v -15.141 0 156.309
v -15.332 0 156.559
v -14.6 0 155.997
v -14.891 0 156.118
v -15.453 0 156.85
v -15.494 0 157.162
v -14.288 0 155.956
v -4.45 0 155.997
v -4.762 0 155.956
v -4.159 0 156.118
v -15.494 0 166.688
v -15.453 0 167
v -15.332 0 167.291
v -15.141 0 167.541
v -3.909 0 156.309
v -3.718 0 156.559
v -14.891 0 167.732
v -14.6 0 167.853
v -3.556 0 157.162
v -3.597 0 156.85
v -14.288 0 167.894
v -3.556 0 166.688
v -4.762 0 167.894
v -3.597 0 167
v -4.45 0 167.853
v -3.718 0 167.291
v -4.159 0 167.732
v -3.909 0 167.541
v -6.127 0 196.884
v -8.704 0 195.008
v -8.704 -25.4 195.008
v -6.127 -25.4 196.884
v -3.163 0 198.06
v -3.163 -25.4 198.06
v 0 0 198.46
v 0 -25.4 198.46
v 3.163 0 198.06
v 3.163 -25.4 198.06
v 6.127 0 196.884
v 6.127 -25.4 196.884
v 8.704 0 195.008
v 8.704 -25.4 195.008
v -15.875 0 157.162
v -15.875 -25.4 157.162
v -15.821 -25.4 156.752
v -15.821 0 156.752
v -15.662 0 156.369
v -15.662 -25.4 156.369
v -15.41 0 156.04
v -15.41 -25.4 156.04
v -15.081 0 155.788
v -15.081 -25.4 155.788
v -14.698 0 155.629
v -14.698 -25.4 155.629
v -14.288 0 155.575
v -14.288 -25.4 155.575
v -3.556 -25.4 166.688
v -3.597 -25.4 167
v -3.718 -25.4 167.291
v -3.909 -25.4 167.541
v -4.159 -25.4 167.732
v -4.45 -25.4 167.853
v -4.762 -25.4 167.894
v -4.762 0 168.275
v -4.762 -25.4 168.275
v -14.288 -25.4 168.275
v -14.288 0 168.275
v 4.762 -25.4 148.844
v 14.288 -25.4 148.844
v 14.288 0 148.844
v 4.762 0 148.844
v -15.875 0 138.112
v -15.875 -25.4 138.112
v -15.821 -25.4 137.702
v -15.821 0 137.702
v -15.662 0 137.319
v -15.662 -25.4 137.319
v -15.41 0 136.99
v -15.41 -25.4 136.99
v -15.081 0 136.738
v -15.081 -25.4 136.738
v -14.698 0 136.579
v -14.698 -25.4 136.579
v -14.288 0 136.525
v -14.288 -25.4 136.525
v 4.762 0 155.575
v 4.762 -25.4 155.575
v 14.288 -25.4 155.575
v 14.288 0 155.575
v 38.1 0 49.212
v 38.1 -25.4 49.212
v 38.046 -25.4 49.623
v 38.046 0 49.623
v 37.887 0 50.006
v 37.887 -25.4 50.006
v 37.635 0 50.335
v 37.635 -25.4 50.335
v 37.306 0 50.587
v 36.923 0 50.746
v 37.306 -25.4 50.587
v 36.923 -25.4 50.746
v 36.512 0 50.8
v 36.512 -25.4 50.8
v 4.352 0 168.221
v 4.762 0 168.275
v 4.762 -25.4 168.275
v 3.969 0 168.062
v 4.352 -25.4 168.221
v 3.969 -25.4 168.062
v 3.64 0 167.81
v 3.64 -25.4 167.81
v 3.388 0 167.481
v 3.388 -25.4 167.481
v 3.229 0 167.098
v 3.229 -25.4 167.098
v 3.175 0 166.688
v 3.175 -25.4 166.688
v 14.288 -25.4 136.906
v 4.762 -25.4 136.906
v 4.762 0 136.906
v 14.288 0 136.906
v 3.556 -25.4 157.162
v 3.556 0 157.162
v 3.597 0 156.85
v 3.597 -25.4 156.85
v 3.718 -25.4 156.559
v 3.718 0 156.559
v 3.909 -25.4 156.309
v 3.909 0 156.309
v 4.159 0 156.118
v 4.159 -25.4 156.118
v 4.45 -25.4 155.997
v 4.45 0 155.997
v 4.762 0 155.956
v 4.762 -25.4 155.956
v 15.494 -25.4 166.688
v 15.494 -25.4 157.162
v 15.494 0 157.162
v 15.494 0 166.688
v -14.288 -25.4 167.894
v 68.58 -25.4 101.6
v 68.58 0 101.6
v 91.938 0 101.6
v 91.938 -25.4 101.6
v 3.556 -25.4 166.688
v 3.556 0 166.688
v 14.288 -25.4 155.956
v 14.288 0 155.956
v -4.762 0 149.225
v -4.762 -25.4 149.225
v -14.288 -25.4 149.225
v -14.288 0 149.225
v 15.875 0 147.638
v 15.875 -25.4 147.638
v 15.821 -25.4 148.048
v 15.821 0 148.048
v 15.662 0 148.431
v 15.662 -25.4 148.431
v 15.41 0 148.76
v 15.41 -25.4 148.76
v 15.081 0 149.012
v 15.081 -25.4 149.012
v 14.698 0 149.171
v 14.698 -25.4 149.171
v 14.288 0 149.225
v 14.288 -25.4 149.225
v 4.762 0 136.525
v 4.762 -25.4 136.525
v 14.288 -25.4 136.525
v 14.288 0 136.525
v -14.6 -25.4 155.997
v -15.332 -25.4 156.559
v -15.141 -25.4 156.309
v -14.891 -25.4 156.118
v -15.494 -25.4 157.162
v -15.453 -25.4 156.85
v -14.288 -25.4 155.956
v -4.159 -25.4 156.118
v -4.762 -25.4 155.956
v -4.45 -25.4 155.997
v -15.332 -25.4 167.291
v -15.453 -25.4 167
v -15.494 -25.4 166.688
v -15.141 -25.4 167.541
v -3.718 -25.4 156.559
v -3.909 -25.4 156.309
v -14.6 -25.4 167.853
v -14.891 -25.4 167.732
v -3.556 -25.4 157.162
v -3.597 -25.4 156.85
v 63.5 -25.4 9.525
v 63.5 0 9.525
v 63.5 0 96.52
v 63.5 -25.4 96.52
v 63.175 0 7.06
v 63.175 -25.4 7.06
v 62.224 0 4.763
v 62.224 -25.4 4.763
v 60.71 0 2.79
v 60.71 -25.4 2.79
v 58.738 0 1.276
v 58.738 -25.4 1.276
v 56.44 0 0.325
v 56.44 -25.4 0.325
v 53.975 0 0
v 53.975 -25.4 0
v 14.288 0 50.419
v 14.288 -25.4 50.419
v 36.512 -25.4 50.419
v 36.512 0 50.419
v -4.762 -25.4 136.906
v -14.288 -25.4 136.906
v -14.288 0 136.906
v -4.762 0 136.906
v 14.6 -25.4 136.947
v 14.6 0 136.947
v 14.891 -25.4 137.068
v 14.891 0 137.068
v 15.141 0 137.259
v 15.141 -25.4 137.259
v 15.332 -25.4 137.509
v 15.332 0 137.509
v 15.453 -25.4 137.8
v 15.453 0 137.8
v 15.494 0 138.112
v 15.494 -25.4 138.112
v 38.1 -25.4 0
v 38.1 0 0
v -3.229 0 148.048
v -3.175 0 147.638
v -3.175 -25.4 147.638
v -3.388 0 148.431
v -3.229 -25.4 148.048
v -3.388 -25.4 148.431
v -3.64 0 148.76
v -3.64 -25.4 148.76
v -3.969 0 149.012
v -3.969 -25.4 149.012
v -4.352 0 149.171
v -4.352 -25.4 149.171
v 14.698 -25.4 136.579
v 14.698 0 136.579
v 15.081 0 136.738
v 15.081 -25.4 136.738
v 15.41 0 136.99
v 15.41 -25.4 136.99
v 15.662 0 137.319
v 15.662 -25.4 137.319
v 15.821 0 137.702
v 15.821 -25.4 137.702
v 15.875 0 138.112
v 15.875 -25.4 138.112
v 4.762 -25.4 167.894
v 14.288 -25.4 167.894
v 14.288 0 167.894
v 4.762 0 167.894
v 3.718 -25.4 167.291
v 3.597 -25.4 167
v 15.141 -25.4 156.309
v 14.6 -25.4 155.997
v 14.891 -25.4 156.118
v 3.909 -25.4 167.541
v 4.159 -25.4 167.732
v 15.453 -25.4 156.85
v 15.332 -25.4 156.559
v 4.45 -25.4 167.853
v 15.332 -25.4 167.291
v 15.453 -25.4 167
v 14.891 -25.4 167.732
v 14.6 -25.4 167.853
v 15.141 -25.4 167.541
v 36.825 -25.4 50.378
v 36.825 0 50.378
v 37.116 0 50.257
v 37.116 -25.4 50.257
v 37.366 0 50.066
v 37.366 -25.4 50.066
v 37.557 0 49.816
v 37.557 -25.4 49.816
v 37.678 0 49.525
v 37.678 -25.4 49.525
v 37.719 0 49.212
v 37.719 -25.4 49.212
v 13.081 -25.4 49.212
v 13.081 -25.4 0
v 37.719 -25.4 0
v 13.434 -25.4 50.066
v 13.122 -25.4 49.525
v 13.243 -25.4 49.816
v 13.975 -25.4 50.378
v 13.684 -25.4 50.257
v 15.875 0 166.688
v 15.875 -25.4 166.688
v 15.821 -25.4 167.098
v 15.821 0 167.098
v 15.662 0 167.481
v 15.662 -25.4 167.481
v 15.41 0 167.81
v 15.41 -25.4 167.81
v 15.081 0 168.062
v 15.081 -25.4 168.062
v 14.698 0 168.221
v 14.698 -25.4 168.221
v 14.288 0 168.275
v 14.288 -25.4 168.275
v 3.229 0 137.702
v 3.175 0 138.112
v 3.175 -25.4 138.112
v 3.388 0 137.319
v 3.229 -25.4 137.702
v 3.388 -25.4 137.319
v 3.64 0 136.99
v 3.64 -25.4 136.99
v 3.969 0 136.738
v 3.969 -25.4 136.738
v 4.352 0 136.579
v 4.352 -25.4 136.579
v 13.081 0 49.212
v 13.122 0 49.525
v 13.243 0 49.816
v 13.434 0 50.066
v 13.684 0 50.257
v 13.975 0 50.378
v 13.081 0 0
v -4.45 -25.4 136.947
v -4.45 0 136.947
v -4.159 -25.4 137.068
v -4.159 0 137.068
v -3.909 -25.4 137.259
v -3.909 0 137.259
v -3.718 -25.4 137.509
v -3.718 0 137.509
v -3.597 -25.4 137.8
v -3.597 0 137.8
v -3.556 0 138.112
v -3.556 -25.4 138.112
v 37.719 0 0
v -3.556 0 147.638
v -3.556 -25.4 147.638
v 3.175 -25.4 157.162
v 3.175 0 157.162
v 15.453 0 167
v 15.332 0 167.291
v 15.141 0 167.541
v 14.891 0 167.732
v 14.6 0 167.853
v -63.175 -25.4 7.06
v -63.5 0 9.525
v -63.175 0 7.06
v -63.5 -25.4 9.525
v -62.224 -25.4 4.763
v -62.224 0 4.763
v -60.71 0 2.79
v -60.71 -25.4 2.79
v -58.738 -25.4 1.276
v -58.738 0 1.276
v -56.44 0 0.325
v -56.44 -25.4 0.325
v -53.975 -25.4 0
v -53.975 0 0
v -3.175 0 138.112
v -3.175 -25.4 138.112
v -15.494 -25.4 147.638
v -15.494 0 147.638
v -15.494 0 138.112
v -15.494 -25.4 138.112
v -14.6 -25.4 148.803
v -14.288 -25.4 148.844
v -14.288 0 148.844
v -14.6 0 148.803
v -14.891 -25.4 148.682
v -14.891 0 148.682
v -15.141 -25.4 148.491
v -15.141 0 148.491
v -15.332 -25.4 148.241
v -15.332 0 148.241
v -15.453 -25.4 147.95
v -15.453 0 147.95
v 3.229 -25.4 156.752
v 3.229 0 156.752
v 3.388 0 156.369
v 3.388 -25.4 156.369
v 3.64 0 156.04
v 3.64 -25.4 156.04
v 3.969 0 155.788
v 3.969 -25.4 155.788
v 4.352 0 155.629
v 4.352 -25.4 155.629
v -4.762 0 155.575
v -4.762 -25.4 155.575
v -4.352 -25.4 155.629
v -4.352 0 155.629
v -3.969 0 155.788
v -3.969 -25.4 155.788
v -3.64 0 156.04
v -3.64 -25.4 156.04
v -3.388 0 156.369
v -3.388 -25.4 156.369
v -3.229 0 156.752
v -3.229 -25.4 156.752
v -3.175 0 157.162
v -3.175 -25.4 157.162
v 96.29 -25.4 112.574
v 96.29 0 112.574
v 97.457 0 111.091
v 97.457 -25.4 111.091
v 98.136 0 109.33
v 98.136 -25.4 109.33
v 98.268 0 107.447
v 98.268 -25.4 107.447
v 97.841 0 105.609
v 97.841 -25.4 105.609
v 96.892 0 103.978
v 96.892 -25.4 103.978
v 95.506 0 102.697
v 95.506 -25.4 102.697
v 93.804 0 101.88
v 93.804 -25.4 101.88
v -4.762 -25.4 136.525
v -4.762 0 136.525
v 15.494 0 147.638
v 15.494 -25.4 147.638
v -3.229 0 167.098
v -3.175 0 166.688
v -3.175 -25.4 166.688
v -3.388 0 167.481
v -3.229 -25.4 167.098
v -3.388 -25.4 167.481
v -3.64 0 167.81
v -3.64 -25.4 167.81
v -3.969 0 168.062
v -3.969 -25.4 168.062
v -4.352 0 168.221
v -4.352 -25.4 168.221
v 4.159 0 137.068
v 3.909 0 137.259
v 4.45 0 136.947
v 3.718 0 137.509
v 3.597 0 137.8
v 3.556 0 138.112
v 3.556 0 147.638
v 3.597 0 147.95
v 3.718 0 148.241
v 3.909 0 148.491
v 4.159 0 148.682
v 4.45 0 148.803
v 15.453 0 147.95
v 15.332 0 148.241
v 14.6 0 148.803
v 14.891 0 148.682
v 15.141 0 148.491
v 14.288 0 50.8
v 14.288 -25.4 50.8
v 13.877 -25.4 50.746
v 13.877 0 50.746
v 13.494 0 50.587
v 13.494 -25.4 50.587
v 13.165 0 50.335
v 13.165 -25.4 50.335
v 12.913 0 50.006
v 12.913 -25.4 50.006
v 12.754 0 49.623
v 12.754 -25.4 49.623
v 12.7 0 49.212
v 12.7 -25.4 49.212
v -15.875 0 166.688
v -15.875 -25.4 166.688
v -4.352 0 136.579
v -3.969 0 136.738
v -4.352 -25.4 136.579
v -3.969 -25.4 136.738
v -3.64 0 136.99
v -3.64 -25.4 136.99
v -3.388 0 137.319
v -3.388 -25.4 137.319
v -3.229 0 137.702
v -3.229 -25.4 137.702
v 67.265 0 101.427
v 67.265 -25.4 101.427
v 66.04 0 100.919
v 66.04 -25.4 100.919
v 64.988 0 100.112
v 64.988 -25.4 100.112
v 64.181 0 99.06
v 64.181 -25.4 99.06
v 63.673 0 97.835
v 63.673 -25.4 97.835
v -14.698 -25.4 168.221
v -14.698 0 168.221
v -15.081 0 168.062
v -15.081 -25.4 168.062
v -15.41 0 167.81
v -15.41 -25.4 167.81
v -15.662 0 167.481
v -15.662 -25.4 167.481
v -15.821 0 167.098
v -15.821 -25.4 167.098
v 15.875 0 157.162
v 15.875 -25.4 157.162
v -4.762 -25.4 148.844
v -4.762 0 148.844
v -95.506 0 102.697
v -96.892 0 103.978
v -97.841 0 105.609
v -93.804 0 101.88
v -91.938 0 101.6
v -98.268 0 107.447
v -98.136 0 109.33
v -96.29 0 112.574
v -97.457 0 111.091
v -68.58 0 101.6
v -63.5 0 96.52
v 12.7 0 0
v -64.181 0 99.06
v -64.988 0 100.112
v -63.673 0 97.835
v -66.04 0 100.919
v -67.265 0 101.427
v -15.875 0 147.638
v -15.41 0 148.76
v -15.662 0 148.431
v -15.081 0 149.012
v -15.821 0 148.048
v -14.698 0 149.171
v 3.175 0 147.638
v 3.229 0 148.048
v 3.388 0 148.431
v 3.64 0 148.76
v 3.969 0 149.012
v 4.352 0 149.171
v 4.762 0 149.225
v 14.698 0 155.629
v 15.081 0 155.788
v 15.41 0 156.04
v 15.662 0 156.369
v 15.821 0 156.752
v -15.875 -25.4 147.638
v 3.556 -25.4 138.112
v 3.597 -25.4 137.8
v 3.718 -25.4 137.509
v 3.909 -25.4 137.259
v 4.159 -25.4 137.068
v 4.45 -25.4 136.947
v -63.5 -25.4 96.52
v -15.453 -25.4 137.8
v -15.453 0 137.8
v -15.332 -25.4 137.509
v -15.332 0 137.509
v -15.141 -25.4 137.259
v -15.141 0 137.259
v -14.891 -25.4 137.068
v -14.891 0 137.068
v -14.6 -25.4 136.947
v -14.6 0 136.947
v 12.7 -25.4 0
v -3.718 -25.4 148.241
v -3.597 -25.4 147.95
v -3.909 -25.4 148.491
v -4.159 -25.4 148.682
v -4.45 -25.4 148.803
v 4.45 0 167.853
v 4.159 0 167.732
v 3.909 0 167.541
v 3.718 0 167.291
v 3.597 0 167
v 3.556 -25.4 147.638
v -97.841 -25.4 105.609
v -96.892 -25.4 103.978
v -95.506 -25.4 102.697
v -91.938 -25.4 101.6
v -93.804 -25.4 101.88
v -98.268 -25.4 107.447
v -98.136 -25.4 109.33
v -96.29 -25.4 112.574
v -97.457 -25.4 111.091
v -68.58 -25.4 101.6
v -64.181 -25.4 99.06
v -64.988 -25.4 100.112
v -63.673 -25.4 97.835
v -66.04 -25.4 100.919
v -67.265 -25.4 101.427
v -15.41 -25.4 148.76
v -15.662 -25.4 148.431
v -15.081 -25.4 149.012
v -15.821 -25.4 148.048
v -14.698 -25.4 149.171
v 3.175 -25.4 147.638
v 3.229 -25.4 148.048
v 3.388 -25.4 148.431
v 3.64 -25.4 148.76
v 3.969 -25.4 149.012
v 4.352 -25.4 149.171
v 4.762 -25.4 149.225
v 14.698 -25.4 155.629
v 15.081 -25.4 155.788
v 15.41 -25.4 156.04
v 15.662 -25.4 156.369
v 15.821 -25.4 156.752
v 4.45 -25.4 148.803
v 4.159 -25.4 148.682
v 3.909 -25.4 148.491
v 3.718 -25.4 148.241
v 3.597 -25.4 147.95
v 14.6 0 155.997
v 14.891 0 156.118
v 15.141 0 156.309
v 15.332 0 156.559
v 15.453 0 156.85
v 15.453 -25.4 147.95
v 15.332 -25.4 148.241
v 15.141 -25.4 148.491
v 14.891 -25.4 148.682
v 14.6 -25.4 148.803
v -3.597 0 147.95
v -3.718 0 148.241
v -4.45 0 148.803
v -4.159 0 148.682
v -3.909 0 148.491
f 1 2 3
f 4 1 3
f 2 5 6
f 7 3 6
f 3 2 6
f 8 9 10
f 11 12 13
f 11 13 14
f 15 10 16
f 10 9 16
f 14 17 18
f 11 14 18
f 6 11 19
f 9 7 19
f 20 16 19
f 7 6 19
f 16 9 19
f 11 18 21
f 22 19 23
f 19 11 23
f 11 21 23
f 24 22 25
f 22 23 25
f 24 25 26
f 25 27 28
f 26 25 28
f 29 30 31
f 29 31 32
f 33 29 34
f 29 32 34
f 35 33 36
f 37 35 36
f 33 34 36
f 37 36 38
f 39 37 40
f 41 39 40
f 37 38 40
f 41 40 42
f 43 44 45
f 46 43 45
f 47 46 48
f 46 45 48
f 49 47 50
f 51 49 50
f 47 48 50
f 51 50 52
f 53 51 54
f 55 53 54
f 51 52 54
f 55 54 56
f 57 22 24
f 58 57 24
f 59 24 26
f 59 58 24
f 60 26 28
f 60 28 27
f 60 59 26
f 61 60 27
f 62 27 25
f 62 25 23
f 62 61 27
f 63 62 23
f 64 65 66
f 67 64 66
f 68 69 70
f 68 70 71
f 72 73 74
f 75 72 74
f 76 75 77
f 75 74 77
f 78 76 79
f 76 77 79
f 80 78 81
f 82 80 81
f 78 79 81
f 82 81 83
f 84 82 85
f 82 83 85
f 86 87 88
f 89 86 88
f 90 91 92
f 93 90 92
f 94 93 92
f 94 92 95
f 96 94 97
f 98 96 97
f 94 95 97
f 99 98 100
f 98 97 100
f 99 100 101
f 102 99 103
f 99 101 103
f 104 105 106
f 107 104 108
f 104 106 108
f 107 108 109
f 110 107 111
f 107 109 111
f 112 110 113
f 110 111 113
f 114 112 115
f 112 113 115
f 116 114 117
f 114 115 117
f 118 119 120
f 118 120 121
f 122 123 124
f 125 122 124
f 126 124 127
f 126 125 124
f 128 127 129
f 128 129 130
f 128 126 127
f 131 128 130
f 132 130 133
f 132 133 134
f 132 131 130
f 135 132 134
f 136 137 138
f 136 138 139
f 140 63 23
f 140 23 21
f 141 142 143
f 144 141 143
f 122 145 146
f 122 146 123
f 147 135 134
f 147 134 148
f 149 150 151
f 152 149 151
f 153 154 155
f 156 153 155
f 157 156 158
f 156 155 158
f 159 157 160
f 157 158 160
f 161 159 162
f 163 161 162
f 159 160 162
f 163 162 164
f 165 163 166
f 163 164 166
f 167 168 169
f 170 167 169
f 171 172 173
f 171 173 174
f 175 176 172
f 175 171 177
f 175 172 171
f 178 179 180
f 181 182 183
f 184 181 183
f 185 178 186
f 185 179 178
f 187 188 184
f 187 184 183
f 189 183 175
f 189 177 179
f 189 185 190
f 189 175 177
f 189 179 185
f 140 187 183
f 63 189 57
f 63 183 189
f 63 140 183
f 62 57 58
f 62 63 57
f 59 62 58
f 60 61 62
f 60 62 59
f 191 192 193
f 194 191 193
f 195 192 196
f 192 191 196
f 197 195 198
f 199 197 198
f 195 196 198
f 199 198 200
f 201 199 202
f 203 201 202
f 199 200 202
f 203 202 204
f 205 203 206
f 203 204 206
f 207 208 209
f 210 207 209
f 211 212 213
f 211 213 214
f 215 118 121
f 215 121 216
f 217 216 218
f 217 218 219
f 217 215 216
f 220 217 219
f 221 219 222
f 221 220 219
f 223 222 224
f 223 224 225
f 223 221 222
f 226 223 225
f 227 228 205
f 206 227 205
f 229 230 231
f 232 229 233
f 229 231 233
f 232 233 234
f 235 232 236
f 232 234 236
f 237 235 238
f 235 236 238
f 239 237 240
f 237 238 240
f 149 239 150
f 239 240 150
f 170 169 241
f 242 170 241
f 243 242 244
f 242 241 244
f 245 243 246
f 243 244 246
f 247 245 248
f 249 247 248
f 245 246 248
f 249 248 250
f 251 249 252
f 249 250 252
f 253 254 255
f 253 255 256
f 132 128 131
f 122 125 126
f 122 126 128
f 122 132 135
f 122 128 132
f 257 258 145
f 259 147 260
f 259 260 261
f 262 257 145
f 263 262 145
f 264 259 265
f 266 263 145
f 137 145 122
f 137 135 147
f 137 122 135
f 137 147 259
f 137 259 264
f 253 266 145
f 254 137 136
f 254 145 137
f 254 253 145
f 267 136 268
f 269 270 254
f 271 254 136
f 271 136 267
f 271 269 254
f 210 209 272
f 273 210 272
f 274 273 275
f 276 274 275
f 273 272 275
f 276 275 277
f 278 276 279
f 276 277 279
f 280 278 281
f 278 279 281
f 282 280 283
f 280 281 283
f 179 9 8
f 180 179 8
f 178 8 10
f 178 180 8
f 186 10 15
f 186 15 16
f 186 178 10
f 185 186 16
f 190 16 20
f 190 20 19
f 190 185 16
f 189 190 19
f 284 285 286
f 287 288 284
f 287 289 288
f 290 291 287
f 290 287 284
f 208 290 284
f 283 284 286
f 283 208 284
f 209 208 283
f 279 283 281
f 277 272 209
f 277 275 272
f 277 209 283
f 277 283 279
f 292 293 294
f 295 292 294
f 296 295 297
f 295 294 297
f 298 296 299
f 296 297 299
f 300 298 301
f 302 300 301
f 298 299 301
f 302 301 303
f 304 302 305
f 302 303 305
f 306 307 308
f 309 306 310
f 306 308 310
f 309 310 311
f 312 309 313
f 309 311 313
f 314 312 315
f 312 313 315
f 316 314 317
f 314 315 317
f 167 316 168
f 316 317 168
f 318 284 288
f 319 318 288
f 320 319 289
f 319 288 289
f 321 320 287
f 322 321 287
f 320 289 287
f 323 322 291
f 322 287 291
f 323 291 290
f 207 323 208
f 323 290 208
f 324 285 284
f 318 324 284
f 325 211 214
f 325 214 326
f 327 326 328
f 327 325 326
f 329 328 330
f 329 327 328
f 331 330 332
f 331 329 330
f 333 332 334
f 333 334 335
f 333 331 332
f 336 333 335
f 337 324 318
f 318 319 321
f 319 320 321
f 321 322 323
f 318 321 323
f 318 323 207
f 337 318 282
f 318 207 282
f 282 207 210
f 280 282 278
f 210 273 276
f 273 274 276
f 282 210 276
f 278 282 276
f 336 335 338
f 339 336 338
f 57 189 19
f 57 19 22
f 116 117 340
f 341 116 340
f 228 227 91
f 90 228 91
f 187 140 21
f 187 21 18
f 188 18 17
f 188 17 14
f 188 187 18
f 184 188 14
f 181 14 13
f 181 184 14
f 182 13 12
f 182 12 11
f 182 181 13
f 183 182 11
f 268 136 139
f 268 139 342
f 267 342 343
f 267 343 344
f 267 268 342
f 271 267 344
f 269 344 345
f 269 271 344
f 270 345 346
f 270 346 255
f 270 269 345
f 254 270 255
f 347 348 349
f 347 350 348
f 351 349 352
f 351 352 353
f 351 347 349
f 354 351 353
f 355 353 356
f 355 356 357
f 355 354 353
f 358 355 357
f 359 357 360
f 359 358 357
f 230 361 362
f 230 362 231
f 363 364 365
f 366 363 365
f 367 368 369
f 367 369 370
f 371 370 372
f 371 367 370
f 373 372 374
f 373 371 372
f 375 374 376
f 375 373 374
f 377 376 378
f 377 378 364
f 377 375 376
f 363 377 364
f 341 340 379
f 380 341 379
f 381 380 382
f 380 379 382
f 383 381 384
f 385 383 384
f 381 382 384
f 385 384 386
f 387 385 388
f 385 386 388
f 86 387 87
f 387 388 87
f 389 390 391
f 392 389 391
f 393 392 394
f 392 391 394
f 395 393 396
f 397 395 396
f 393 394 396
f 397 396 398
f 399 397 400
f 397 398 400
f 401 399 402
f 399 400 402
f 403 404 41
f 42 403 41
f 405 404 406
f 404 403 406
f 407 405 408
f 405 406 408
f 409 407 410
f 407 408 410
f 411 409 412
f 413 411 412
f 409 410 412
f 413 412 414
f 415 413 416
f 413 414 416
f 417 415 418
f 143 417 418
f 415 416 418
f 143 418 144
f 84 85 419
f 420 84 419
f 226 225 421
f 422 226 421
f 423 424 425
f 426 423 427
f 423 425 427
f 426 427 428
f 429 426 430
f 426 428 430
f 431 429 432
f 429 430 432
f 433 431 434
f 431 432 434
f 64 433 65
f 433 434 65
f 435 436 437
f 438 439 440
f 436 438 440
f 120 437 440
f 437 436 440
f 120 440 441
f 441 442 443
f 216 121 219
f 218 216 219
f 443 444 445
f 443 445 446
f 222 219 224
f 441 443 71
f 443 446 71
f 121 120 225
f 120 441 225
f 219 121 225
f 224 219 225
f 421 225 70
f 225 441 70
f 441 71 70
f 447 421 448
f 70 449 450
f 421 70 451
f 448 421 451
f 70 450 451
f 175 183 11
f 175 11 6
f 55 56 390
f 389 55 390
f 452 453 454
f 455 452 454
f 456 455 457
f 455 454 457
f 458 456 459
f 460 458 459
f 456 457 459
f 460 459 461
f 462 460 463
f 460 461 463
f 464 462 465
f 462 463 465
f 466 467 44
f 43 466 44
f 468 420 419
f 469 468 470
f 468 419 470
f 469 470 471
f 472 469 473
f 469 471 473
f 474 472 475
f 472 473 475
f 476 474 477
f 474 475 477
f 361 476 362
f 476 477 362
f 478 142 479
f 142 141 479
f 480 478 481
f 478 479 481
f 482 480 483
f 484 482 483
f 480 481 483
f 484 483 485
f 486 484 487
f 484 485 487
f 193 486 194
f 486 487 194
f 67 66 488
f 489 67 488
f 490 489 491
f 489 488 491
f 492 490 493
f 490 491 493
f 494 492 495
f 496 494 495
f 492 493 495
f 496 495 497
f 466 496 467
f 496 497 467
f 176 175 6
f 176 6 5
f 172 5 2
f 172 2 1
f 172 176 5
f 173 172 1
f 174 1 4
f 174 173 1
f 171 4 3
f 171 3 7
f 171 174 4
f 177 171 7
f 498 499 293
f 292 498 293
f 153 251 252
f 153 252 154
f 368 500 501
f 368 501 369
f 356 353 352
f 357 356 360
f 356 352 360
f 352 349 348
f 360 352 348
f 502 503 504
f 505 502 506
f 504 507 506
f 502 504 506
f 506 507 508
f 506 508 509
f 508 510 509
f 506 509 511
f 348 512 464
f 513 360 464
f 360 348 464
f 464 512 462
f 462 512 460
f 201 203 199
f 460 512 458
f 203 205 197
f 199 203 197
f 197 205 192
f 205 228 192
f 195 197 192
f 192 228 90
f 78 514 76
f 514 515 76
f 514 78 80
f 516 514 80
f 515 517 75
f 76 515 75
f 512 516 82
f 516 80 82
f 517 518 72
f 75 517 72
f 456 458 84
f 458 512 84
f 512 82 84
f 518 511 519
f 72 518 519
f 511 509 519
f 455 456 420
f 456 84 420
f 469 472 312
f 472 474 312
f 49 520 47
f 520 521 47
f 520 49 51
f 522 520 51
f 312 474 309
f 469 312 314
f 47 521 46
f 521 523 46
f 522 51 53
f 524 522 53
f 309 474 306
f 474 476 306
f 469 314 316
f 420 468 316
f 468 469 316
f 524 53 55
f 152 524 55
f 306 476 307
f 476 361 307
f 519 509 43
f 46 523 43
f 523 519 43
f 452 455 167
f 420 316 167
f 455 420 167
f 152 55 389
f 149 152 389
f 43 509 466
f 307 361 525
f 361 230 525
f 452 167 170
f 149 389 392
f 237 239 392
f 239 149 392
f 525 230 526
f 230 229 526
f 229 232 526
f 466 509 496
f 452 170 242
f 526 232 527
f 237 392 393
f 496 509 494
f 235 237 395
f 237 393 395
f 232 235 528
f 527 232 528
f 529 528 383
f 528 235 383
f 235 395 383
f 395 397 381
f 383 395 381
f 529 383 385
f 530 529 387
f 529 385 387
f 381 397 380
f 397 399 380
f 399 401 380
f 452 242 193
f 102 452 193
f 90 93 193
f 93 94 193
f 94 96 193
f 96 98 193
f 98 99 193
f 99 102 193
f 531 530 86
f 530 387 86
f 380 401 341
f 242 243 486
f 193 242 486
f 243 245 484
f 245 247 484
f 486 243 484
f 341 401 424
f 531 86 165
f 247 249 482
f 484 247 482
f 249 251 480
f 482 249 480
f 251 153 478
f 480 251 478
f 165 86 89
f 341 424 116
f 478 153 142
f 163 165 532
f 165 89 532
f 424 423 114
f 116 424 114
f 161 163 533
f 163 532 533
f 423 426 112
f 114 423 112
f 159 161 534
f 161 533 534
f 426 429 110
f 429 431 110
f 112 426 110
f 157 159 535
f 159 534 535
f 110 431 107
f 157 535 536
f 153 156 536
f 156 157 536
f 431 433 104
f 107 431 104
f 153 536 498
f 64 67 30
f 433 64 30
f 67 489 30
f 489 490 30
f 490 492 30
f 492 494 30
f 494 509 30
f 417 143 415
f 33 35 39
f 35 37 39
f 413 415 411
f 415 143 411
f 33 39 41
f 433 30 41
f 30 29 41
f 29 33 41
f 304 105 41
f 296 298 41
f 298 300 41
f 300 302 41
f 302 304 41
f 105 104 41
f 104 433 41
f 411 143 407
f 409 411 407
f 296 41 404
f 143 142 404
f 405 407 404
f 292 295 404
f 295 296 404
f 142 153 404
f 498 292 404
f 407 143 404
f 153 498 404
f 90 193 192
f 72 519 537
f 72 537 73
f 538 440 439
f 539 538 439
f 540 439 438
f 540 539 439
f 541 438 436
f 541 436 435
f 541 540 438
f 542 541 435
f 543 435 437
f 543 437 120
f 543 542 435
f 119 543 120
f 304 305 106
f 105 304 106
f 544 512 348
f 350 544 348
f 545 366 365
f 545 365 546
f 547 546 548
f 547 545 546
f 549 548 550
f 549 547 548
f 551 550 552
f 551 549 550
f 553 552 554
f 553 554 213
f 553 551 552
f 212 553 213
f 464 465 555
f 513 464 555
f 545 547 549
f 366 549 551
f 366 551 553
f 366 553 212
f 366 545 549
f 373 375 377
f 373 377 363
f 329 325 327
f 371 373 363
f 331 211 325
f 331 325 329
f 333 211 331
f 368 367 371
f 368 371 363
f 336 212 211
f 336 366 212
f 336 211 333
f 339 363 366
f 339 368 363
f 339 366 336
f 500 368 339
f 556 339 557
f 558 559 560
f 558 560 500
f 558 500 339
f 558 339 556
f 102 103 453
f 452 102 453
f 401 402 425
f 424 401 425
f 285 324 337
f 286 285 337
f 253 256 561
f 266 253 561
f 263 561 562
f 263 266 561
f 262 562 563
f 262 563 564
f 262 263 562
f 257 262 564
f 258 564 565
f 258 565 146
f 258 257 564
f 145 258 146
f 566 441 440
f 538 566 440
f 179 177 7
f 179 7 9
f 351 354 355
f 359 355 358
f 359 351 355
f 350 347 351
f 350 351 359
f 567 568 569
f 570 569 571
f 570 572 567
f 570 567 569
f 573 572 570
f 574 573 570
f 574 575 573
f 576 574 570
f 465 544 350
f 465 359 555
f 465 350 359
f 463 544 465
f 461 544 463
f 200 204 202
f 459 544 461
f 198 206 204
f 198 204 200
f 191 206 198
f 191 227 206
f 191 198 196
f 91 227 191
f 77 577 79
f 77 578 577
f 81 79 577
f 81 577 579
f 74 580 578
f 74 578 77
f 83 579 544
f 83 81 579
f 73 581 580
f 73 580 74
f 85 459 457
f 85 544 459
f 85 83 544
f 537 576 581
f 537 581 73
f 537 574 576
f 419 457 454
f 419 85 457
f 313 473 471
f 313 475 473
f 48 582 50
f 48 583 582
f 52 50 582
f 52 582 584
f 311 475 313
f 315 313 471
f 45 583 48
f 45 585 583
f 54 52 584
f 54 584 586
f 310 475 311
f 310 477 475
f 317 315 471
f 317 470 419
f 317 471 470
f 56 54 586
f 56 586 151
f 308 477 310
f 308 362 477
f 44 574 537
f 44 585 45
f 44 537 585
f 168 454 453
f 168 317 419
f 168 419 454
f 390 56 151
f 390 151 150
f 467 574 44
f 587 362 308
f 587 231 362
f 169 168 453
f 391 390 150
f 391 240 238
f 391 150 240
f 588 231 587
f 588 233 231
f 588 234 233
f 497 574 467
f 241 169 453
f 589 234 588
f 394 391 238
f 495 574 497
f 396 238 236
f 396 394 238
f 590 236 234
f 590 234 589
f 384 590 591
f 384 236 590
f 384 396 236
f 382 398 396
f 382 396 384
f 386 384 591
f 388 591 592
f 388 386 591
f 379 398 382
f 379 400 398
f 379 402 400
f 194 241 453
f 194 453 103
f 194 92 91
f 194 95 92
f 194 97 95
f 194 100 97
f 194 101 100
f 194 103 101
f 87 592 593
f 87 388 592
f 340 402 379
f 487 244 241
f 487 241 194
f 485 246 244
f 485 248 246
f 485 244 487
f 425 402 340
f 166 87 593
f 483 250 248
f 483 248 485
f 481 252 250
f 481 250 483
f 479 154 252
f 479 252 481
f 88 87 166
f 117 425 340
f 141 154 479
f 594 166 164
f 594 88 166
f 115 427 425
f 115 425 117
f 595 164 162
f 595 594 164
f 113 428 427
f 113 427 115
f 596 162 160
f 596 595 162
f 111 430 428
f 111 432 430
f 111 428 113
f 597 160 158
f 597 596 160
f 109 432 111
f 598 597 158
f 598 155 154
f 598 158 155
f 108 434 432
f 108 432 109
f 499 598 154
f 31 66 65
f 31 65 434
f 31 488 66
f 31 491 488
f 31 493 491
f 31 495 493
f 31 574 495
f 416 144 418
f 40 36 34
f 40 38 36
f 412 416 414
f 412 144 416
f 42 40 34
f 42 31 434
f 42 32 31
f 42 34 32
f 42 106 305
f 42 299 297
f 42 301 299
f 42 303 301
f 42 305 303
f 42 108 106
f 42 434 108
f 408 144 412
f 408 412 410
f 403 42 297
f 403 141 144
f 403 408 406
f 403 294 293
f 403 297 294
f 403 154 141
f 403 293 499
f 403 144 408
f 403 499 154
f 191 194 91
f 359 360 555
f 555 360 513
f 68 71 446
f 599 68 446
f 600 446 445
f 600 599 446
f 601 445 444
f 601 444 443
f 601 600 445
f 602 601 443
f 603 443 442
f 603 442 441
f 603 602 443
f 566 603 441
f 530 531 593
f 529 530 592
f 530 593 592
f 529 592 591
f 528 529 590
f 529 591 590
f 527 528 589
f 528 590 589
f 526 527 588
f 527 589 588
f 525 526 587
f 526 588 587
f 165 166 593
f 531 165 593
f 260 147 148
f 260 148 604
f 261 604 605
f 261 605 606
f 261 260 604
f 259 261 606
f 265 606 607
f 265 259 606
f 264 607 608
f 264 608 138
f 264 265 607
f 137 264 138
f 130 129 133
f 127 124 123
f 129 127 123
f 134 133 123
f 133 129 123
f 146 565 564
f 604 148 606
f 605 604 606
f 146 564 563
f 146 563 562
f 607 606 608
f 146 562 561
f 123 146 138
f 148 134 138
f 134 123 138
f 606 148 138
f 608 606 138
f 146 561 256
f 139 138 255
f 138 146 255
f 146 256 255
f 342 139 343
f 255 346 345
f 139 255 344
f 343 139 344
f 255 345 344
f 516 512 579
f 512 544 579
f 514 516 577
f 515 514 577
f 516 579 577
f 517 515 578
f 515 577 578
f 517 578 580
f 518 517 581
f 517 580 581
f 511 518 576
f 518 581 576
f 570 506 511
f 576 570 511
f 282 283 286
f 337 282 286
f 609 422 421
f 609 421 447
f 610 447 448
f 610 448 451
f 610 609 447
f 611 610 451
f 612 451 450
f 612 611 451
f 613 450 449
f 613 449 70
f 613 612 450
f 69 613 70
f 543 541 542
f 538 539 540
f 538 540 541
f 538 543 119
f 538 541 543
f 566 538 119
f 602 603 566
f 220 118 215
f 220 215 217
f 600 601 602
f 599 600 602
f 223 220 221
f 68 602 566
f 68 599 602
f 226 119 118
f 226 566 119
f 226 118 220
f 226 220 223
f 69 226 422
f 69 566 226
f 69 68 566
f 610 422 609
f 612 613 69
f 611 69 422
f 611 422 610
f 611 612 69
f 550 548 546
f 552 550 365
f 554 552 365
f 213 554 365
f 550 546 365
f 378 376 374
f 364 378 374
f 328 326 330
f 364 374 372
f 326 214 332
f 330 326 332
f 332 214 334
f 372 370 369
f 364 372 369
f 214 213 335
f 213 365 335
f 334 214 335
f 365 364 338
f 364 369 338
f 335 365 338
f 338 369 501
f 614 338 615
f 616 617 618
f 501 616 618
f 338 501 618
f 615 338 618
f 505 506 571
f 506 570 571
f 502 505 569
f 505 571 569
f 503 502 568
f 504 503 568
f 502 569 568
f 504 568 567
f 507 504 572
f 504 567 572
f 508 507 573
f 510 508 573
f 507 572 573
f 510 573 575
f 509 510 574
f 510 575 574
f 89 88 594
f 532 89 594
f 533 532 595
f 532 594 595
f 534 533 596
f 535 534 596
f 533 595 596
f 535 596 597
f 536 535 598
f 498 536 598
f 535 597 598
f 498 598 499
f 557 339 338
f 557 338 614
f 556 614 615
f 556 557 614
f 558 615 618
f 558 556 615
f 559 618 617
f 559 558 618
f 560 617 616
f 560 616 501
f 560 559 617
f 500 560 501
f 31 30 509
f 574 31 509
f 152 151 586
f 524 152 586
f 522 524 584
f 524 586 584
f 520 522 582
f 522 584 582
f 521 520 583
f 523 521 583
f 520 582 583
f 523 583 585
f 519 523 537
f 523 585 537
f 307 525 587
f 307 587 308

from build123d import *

# Parameters (mm, degrees)
F0_W     = 25.0974502414
F0_H     = 46.2554767728
F1_DEPTH = 25.4
F3_DEPTH = 25.4
F5_DEPTH = 25.4
F7_DEPTH = 25.4
F8_R     = 6.35
F9_R     = 12.7
F10_R    = 9.525
F11_R    = 5.08


with BuildPart() as f1:
    # F0 (on Front) → F1 (new body)
    with BuildSketch(Plane.XZ):
        Polygon((-63.5, 101.6), (-63.5, 0), (9.4117764384, 0), (9.4117764384, 46.2554767728), (34.5092266798, 46.2554767728), (34.5092266798, 0), (63.5, 0), (63.5, 101.6), (107.95, 101.6), (0, 203.2), (-107.95, 101.6), align=None)
        with Locations((21.9605015591, 23.1277383864)):
            Rectangle(F0_W, F0_H)
    extrude(amount=F1_DEPTH)

    # F2 (on face) → F3 (cut)
    with BuildSketch(Plane.XZ.offset(25.4)):
        with BuildLine():
            Line((14.2875, 168.275), (4.7625, 168.275))
            ThreePointArc((4.7625, 168.275), (3.6399679849, 167.8100320151), (3.175, 166.6875))
            Line((3.175, 166.6875), (3.175, 157.1625))
            ThreePointArc((3.175, 157.1625), (3.6399679849, 156.0399679849), (4.7625, 155.575))
            Line((4.7625, 155.575), (14.2875, 155.575))
            ThreePointArc((14.2875, 155.575), (15.4100320151, 156.0399679849), (15.875, 157.1625))
            Line((15.875, 157.1625), (15.875, 166.6875))
            ThreePointArc((15.875, 166.6875), (15.4100320151, 167.8100320151), (14.2875, 168.275))
        make_face()
        with BuildLine():
            Line((-4.7625, 149.225), (-14.2875, 149.225))
            ThreePointArc((-14.2875, 149.225), (-15.4100320151, 148.7600320151), (-15.875, 147.6375))
            Line((-15.875, 147.6375), (-15.875, 138.1125))
            ThreePointArc((-15.875, 138.1125), (-15.4100320151, 136.9899679849), (-14.2875, 136.525))
            Line((-14.2875, 136.525), (-4.7625, 136.525))
            ThreePointArc((-4.7625, 136.525), (-3.6399679849, 136.9899679849), (-3.175, 138.1125))
            Line((-3.175, 138.1125), (-3.175, 147.6375))
            ThreePointArc((-3.175, 147.6375), (-3.6399679849, 148.7600320151), (-4.7625, 149.225))
        make_face()
        with BuildLine():
            Line((14.2875, 149.225), (4.7625, 149.225))
            ThreePointArc((4.7625, 149.225), (3.6399679849, 148.7600320151), (3.175, 147.6375))
            Line((3.175, 147.6375), (3.175, 138.1125))
            ThreePointArc((3.175, 138.1125), (3.6399679849, 136.9899679849), (4.7625, 136.525))
            Line((4.7625, 136.525), (14.2875, 136.525))
            ThreePointArc((14.2875, 136.525), (15.4100320151, 136.9899679849), (15.875, 138.1125))
            Line((15.875, 138.1125), (15.875, 147.6375))
            ThreePointArc((15.875, 147.6375), (15.4100320151, 148.7600320151), (14.2875, 149.225))
        make_face()
        with BuildLine():
            Line((-4.7625, 168.275), (-14.2875, 168.275))
            ThreePointArc((-14.2875, 168.275), (-15.4100320151, 167.8100320151), (-15.875, 166.6875))
            Line((-15.875, 166.6875), (-15.875, 157.1625))
            ThreePointArc((-15.875, 157.1625), (-15.4100320151, 156.0399679849), (-14.2875, 155.575))
            Line((-14.2875, 155.575), (-4.7625, 155.575))
            ThreePointArc((-4.7625, 155.575), (-3.6399679849, 156.0399679849), (-3.175, 157.1625))
            Line((-3.175, 157.1625), (-3.175, 166.6875))
            ThreePointArc((-3.175, 166.6875), (-3.6399679849, 167.8100320151), (-4.7625, 168.275))
        make_face()
    extrude(amount=-F3_DEPTH, mode=Mode.SUBTRACT)

    # F6 (on face) → F7 (cut)
    with BuildSketch(Plane.XZ.offset(25.4)):
        with BuildLine():
            Line((12.7, 49.2125), (12.7, 0))
            Line((12.7, 0), (13.081, 0))
            Line((13.081, 0), (13.081, 49.2125))
            ThreePointArc((13.081, 49.2125), (13.4343756685, 50.0656243315), (14.2875, 50.419))
            Line((14.2875, 50.419), (36.5125, 50.419))
            ThreePointArc((36.5125, 50.419), (37.3656243315, 50.0656243315), (37.719, 49.2125))
            Line((37.719, 49.2125), (37.719, 0))
            Line((37.719, 0), (38.1, 0))
            Line((38.1, 0), (38.1, 49.2125))
            ThreePointArc((38.1, 49.2125), (37.6350320151, 50.3350320151), (36.5125, 50.8))
            Line((36.5125, 50.8), (14.2875, 50.8))
            ThreePointArc((14.2875, 50.8), (13.1649679849, 50.3350320151), (12.7, 49.2125))
        make_face()
    extrude(amount=-F7_DEPTH, mode=Mode.SUBTRACT)

    # F8
    f8_edges = [f1.edges().sort_by_distance(p)[0] for p in [
        (107.95, -12.7, 101.6),
        (-107.95, -12.7, 101.6),
    ]]
    fillet(f8_edges, radius=F8_R)

    # F9
    f9_edges = [f1.edges().sort_by_distance(p)[0] for p in [
        (0, -12.7, 203.2),
    ]]
    fillet(f9_edges, radius=F9_R)

    # F10
    f10_edges = [f1.edges().sort_by_distance(p)[0] for p in [
        (63.5, -12.7, 0),
        (-63.5, -12.7, 0),
    ]]
    fillet(f10_edges, radius=F10_R)

    # F11
    f11_edges = [f1.edges().sort_by_distance(p)[0] for p in [
        (-63.5, -12.7, 101.6),
        (63.5, -12.7, 101.6),
    ]]
    fillet(f11_edges, radius=F11_R)


with BuildPart() as f5:
    # F4 (on face) → F5 (new body)
    with BuildSketch(Plane.XZ.offset(25.4)):
        with BuildLine():
            Line((-4.7625, 167.894), (-14.2875, 167.894))
            ThreePointArc((-14.2875, 167.894), (-15.1406243315, 167.5406243315), (-15.494, 166.6875))
            Line((-15.494, 166.6875), (-15.494, 157.1625))
            ThreePointArc((-15.494, 157.1625), (-15.1406243315, 156.3093756685), (-14.2875, 155.956))
            Line((-14.2875, 155.956), (-4.7625, 155.956))
            ThreePointArc((-4.7625, 155.956), (-3.9093756685, 156.3093756685), (-3.556, 157.1625))
            Line((-3.556, 157.1625), (-3.556, 166.6875))
            ThreePointArc((-3.556, 166.6875), (-3.9093756685, 167.5406243315), (-4.7625, 167.894))
        make_face()
    extrude(amount=-F5_DEPTH)


with BuildPart() as f5b:
    # F4 (on face) → F5, piece 2 (new body)
    with BuildSketch(Plane.XZ.offset(25.4)):
        with BuildLine():
            Line((14.2875, 167.894), (4.7625, 167.894))
            ThreePointArc((4.7625, 167.894), (3.9093756685, 167.5406243315), (3.556, 166.6875))
            Line((3.556, 166.6875), (3.556, 157.1625))
            ThreePointArc((3.556, 157.1625), (3.9093756685, 156.3093756685), (4.7625, 155.956))
            Line((4.7625, 155.956), (14.2875, 155.956))
            ThreePointArc((14.2875, 155.956), (15.1406243315, 156.3093756685), (15.494, 157.1625))
            Line((15.494, 157.1625), (15.494, 166.6875))
            ThreePointArc((15.494, 166.6875), (15.1406243315, 167.5406243315), (14.2875, 167.894))
        make_face()
    extrude(amount=-F5_DEPTH)


with BuildPart() as f5c:
    # F4 (on face) → F5, piece 3 (new body)
    with BuildSketch(Plane.XZ.offset(25.4)):
        with BuildLine():
            Line((-4.7625, 148.8440036774), (-14.2875, 148.8440036774))
            ThreePointArc((-14.2875, 148.8440036774), (-15.1406269318, 148.4906269318), (-15.4940036774, 147.6375))
            Line((-15.4940036774, 147.6375), (-15.4940036774, 138.1125))
            ThreePointArc((-15.4940036774, 138.1125), (-15.1406269318, 137.2593730682), (-14.2875, 136.9059963226))
            Line((-14.2875, 136.9059963226), (-4.7625, 136.9059963226))
            ThreePointArc((-4.7625, 136.9059963226), (-3.9093730682, 137.2593730682), (-3.5559963226, 138.1125))
            Line((-3.5559963226, 138.1125), (-3.5559963226, 147.6375))
            ThreePointArc((-3.5559963226, 147.6375), (-3.9093730682, 148.4906269318), (-4.7625, 148.8440036774))
        make_face()
    extrude(amount=-F5_DEPTH)


with BuildPart() as f5d:
    # F4 (on face) → F5, piece 4 (new body)
    with BuildSketch(Plane.XZ.offset(25.4)):
        with BuildLine():
            Line((14.2875, 148.844), (4.7625, 148.844))
            ThreePointArc((4.7625, 148.844), (3.9093756685, 148.4906243315), (3.556, 147.6375))
            Line((3.556, 147.6375), (3.556, 138.1125))
            ThreePointArc((3.556, 138.1125), (3.9093756685, 137.2593756685), (4.7625, 136.906))
            Line((4.7625, 136.906), (14.2875, 136.906))
            ThreePointArc((14.2875, 136.906), (15.1406243315, 137.2593756685), (15.494, 138.1125))
            Line((15.494, 138.1125), (15.494, 147.6375))
            ThreePointArc((15.494, 147.6375), (15.1406243315, 148.4906243315), (14.2875, 148.844))
        make_face()
    extrude(amount=-F5_DEPTH)


solid = Compound([f1.part, f5.part, f5b.part, f5c.part, f5d.part])
